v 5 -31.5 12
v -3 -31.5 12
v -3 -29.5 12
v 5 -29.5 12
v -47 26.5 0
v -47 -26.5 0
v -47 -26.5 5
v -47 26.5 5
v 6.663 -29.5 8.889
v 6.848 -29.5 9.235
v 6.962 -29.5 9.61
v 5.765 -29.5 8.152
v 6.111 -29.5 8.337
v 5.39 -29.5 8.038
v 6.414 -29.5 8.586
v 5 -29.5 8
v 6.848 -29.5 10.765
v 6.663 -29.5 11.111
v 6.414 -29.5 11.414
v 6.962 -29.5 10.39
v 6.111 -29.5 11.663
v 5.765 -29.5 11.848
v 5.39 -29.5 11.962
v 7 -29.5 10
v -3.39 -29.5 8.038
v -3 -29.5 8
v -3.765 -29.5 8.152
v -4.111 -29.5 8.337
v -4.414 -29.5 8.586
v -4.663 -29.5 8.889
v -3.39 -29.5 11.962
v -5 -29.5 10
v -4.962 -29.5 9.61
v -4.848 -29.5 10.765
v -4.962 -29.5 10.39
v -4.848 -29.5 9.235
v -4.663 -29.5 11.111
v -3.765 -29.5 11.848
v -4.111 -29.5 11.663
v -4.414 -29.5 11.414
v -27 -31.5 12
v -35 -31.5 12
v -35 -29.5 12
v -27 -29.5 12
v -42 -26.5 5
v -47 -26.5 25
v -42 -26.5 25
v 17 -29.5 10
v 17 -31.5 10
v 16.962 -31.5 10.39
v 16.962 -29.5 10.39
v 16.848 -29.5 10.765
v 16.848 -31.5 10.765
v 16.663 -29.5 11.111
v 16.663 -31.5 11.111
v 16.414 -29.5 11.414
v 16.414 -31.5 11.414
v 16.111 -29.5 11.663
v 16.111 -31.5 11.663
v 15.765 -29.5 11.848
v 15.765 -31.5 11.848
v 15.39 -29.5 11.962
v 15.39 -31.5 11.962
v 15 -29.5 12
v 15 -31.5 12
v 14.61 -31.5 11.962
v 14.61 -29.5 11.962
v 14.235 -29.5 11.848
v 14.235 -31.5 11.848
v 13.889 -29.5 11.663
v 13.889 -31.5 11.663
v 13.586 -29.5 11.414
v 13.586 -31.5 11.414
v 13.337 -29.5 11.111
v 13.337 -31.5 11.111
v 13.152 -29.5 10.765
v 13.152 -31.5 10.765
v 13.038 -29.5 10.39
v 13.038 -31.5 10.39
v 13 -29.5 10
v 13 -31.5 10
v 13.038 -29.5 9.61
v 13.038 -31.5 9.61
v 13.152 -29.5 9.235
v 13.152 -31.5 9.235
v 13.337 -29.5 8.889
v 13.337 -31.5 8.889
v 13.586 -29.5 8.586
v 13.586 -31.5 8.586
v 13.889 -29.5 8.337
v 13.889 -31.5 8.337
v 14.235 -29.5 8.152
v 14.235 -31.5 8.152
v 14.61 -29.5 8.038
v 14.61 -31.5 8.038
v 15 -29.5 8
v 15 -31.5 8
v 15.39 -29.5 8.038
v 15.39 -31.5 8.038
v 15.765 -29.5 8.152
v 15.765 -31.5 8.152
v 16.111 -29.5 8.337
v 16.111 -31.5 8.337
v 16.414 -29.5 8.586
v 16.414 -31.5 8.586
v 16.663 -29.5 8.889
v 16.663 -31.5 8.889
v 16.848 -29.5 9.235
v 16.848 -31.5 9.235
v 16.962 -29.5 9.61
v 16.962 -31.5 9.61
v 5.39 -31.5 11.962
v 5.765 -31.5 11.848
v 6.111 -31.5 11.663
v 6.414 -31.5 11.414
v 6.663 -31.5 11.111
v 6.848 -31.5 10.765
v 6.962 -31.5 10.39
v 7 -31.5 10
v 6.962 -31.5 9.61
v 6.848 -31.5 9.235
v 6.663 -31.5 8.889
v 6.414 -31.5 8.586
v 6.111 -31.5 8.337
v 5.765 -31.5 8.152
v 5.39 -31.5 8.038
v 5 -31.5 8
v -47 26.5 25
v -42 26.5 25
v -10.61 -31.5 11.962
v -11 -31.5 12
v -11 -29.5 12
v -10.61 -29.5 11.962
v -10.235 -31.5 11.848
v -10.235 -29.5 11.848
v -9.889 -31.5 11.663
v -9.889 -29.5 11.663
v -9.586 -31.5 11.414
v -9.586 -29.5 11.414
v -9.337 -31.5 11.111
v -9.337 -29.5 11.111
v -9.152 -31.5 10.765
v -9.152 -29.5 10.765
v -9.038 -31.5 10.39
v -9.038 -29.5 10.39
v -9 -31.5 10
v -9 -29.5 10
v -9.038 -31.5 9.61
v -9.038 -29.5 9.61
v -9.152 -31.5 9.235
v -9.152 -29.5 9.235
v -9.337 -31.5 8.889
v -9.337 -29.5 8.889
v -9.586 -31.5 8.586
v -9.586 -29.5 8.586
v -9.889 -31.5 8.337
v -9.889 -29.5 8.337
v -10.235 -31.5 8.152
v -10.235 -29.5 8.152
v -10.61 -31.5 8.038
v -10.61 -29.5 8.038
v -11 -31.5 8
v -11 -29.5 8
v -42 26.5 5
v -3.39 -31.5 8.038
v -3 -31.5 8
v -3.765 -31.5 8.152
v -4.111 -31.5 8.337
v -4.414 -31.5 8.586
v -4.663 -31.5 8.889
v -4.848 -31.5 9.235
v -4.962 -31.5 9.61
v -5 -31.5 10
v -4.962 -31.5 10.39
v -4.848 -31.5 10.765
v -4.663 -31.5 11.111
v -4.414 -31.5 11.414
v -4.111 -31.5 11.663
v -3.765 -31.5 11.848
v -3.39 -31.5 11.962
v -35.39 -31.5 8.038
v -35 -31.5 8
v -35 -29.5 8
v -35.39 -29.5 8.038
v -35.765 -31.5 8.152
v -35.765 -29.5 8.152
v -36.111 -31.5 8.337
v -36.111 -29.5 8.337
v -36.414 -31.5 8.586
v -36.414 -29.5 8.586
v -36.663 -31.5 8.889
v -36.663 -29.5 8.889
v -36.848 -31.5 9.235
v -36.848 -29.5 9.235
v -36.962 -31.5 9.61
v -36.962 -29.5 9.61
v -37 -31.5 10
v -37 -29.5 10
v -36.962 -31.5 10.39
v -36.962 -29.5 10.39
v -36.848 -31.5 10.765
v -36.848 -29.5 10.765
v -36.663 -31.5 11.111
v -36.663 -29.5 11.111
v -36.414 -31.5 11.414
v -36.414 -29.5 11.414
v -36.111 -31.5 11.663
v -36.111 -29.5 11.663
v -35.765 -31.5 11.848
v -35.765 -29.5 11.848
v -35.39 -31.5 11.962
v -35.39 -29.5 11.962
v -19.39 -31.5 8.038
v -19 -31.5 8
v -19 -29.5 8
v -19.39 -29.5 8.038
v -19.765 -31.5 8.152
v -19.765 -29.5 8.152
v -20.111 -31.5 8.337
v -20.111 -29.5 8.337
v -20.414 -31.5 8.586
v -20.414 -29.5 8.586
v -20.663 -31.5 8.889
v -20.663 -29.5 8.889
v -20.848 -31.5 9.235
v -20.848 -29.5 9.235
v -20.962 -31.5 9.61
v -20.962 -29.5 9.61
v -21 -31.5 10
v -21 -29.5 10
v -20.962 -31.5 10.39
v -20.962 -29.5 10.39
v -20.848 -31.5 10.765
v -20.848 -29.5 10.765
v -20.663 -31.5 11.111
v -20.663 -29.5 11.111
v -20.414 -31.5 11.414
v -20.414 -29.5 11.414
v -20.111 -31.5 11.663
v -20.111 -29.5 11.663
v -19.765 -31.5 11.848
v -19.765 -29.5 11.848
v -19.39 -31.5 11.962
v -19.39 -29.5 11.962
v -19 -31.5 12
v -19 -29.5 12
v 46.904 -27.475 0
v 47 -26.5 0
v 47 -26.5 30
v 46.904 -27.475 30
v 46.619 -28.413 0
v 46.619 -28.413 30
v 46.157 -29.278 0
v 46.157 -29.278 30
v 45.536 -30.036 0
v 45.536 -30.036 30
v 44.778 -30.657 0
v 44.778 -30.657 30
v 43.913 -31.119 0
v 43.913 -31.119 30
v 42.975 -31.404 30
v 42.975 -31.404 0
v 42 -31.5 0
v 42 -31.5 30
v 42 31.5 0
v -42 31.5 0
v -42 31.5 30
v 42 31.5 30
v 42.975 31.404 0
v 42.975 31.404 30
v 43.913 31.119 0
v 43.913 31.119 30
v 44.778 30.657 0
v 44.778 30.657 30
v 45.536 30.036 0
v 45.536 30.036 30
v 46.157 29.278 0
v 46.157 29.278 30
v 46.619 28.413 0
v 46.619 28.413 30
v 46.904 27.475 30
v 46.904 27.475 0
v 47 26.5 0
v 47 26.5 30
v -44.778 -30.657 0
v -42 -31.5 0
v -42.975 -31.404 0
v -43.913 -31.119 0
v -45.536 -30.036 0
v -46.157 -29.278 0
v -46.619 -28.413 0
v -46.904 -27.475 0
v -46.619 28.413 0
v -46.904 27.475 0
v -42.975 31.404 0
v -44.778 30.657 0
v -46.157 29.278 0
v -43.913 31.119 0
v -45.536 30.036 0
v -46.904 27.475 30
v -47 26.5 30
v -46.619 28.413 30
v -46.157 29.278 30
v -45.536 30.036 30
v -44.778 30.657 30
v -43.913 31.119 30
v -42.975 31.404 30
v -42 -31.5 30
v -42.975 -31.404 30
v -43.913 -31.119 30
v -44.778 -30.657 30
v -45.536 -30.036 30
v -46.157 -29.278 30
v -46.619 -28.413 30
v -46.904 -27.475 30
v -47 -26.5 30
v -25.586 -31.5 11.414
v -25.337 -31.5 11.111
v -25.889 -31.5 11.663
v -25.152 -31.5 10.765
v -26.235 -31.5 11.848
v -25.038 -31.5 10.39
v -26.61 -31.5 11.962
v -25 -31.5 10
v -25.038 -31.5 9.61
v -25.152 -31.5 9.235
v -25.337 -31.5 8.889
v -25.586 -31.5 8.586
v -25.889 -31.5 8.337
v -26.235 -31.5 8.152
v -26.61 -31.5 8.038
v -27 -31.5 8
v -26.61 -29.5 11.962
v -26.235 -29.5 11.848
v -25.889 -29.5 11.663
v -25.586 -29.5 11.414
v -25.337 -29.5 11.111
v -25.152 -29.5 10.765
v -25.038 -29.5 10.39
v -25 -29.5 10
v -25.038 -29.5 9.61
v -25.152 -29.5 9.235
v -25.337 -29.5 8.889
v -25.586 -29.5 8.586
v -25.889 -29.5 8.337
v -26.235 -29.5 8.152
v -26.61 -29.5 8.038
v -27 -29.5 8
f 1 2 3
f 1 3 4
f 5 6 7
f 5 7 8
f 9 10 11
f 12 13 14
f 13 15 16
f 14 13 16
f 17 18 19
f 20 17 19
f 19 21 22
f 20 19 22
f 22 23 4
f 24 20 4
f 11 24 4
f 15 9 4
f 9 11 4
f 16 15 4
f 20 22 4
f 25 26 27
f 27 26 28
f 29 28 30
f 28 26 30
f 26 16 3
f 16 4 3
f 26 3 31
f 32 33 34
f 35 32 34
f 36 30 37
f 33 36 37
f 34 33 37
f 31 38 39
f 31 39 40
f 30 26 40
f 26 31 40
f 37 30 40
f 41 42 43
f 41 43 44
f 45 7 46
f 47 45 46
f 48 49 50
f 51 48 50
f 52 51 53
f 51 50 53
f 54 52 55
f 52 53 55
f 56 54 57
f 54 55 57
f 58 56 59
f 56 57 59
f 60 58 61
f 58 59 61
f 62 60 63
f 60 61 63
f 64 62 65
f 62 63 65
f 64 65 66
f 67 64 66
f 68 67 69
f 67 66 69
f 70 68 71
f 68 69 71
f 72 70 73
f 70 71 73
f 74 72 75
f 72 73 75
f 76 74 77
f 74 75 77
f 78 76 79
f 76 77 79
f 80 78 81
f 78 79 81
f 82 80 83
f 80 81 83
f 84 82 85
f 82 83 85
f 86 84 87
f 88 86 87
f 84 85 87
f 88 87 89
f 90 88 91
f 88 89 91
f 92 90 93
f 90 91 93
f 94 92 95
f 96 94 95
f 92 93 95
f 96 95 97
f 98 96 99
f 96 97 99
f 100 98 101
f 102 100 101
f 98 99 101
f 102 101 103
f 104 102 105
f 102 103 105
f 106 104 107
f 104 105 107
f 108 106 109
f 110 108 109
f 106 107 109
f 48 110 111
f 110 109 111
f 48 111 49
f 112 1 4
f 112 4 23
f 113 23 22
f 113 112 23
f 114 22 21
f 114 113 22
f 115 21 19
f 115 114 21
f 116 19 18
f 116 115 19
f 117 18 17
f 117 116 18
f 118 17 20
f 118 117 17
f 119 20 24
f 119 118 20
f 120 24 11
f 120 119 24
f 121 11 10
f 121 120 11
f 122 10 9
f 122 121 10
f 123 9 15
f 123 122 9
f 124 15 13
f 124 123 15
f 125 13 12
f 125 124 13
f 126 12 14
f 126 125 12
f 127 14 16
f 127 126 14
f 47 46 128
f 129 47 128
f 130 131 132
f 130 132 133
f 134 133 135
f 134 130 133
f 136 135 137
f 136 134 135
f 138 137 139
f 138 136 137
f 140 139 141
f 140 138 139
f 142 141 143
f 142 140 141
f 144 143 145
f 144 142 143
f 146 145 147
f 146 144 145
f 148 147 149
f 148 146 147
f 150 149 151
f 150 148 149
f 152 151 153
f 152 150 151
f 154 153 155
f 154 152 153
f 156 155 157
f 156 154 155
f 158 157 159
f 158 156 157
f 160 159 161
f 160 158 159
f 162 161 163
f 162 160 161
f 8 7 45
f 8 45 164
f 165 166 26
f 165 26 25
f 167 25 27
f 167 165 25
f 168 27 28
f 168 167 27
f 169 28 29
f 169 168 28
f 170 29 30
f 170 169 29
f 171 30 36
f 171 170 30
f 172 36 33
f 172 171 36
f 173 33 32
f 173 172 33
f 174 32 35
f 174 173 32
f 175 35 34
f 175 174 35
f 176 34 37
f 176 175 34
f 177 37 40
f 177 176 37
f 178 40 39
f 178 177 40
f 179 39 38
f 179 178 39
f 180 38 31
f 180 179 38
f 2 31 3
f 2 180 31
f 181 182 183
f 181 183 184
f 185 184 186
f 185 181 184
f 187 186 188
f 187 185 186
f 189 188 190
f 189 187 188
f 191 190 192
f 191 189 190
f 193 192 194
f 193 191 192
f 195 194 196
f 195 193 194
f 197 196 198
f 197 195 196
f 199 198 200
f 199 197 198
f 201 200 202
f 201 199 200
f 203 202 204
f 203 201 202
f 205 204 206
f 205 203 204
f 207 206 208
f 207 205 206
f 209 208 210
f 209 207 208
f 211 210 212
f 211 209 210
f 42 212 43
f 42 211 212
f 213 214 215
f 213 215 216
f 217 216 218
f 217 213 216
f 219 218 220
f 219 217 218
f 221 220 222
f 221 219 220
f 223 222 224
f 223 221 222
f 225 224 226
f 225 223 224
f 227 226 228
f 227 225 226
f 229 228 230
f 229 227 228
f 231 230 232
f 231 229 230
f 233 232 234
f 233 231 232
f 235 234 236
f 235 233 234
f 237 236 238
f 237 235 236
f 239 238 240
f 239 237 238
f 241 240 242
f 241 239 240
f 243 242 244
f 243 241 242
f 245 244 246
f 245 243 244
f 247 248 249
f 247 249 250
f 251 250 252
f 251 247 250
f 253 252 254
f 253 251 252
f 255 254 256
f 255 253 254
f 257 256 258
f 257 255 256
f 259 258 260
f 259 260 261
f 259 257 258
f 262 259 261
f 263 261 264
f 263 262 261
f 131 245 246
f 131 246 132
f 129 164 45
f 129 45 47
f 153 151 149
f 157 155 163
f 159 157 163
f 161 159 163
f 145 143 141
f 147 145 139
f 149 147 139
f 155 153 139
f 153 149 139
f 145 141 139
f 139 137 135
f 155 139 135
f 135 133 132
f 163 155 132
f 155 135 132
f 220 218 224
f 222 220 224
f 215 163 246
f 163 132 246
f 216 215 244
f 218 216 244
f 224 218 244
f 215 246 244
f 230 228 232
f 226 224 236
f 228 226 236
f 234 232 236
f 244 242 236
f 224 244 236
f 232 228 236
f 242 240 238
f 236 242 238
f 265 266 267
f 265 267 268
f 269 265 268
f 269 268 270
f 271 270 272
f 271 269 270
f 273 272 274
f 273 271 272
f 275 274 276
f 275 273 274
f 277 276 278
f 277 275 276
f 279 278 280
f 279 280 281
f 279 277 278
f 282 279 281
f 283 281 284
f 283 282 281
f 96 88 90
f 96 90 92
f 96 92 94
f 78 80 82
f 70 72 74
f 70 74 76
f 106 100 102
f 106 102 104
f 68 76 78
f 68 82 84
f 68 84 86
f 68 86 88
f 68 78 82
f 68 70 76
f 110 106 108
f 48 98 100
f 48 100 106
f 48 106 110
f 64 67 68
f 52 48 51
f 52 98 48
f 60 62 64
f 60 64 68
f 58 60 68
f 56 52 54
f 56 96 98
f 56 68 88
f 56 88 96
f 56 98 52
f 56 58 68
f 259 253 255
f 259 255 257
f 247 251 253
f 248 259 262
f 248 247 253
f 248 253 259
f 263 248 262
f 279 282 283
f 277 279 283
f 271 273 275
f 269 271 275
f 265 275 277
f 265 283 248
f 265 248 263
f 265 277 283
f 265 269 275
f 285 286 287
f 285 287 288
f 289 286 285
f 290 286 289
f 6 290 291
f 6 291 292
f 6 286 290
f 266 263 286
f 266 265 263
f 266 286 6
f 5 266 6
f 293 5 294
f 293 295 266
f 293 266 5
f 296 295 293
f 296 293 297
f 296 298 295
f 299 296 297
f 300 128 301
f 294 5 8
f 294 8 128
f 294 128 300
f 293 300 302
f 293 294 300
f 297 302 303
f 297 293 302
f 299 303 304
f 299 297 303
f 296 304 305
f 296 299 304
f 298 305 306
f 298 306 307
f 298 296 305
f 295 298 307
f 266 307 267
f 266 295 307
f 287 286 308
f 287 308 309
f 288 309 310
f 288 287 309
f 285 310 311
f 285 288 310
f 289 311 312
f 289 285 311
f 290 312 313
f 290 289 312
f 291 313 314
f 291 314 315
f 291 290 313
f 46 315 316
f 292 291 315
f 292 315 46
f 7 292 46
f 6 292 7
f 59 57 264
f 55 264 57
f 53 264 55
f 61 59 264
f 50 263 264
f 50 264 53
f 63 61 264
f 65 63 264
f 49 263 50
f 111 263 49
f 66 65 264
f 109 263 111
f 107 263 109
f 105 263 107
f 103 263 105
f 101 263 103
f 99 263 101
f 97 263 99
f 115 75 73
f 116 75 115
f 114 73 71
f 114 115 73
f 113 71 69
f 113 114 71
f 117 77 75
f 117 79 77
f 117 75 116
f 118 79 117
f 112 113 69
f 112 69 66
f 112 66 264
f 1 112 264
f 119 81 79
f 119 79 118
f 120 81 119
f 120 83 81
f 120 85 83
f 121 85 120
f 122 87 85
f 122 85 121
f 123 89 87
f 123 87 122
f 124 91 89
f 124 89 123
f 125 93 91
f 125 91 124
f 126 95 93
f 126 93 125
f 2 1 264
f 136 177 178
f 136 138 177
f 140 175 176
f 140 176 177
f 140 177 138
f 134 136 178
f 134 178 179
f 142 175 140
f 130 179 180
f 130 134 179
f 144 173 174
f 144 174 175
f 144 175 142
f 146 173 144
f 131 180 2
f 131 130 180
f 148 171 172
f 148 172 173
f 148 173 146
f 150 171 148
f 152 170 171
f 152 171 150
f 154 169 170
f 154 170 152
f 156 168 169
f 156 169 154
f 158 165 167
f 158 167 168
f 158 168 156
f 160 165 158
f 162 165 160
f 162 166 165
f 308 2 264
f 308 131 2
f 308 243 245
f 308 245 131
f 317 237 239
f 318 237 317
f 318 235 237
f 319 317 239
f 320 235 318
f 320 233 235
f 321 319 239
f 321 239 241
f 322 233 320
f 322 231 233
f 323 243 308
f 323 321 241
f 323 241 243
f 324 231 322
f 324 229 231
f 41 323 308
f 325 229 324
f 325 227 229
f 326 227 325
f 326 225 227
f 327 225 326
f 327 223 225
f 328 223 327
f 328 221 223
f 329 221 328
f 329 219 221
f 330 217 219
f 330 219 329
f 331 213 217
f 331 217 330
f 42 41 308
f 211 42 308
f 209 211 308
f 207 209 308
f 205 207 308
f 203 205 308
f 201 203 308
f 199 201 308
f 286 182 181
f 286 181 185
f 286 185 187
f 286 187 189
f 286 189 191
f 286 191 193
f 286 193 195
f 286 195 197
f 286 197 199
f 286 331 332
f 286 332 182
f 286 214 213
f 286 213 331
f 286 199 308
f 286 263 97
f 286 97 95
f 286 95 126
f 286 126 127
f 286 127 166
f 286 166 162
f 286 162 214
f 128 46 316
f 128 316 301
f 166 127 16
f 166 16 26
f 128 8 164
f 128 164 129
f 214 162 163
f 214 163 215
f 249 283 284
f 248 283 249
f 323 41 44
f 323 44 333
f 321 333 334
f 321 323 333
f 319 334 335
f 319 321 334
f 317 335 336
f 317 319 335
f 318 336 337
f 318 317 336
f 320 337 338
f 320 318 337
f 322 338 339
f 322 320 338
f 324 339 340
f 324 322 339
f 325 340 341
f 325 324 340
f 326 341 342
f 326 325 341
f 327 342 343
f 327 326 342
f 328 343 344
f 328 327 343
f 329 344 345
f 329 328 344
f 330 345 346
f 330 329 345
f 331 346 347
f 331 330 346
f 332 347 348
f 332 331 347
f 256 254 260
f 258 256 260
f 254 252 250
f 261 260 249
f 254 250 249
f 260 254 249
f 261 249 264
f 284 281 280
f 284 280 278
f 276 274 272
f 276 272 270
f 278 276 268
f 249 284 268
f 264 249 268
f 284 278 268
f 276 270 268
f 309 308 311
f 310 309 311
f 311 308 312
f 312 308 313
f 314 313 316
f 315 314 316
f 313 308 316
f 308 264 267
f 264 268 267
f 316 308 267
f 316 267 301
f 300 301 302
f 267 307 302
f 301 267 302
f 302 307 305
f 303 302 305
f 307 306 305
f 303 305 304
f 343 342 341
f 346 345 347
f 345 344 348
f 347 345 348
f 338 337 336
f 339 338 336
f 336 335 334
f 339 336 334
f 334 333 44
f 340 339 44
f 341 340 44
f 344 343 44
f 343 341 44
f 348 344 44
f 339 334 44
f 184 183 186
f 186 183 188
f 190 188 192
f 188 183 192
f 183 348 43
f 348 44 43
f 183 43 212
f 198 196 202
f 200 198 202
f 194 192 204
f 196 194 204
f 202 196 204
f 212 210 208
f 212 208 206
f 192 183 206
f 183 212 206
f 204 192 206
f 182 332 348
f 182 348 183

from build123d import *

# Parameters (mm, degrees)
BOSS_EXTRUDE1_DEPTH = 30
SKETCH2_R           = 2
CUT_EXTRUDE1_DEPTH  = 2
SKETCH3_W           = 20
SKETCH3_H           = 53
CUT_EXTRUDE2_DEPTH  = 5


with BuildPart() as part:
    # Sketch1 → Boss-Extrude1 (new body)
    with BuildSketch(Plane.XY):
        with BuildLine():
            Line((-42, 31.5), (42, 31.5))
            ThreePointArc((42, 31.5), (45.535533906, 30.035533906), (47, 26.5))
            Line((47, 26.5), (47, -26.5))
            ThreePointArc((47, -26.5), (45.535533906, -30.035533906), (42, -31.5))
            Line((42, -31.5), (-42, -31.5))
            ThreePointArc((-42, -31.5), (-45.535533906, -30.035533906), (-47, -26.5))
            Line((-47, -26.5), (-47, 26.5))
            ThreePointArc((-47, 26.5), (-45.535533906, 30.035533906), (-42, 31.5))
        make_face()
    extrude(amount=BOSS_EXTRUDE1_DEPTH)

    # Sketch2 → Cut-Extrude1 (cut)
    with BuildSketch(Plane.XZ.offset(31.5)):
        with Locations((15, 10)):
            Circle(SKETCH2_R)
        with BuildLine():
            Line((-35, 12), (-27, 12))
            ThreePointArc((-27, 12), (-25, 10), (-27, 8))
            Line((-27, 8), (-35, 8))
            ThreePointArc((-35, 8), (-37, 10), (-35, 12))
        make_face()
        with BuildLine():
            Line((-19, 12), (-11, 12))
            ThreePointArc((-11, 12), (-9, 10), (-11, 8))
            Line((-11, 8), (-19, 8))
            ThreePointArc((-19, 8), (-21, 10), (-19, 12))
        make_face()
        with BuildLine():
            Line((-3, 12), (5, 12))
            ThreePointArc((5, 12), (7, 10), (5, 8))
            Line((5, 8), (-3, 8))
            ThreePointArc((-3, 8), (-5, 10), (-3, 12))
        make_face()
    extrude(amount=-CUT_EXTRUDE1_DEPTH, mode=Mode.SUBTRACT)

    # Sketch3 → Cut-Extrude2 (cut)
    with BuildSketch(Plane.ZY.offset(47)):
        with Locations((15, 0)):
            Rectangle(SKETCH3_W, SKETCH3_H)
    extrude(amount=-CUT_EXTRUDE2_DEPTH, mode=Mode.SUBTRACT)


solid = part.part
